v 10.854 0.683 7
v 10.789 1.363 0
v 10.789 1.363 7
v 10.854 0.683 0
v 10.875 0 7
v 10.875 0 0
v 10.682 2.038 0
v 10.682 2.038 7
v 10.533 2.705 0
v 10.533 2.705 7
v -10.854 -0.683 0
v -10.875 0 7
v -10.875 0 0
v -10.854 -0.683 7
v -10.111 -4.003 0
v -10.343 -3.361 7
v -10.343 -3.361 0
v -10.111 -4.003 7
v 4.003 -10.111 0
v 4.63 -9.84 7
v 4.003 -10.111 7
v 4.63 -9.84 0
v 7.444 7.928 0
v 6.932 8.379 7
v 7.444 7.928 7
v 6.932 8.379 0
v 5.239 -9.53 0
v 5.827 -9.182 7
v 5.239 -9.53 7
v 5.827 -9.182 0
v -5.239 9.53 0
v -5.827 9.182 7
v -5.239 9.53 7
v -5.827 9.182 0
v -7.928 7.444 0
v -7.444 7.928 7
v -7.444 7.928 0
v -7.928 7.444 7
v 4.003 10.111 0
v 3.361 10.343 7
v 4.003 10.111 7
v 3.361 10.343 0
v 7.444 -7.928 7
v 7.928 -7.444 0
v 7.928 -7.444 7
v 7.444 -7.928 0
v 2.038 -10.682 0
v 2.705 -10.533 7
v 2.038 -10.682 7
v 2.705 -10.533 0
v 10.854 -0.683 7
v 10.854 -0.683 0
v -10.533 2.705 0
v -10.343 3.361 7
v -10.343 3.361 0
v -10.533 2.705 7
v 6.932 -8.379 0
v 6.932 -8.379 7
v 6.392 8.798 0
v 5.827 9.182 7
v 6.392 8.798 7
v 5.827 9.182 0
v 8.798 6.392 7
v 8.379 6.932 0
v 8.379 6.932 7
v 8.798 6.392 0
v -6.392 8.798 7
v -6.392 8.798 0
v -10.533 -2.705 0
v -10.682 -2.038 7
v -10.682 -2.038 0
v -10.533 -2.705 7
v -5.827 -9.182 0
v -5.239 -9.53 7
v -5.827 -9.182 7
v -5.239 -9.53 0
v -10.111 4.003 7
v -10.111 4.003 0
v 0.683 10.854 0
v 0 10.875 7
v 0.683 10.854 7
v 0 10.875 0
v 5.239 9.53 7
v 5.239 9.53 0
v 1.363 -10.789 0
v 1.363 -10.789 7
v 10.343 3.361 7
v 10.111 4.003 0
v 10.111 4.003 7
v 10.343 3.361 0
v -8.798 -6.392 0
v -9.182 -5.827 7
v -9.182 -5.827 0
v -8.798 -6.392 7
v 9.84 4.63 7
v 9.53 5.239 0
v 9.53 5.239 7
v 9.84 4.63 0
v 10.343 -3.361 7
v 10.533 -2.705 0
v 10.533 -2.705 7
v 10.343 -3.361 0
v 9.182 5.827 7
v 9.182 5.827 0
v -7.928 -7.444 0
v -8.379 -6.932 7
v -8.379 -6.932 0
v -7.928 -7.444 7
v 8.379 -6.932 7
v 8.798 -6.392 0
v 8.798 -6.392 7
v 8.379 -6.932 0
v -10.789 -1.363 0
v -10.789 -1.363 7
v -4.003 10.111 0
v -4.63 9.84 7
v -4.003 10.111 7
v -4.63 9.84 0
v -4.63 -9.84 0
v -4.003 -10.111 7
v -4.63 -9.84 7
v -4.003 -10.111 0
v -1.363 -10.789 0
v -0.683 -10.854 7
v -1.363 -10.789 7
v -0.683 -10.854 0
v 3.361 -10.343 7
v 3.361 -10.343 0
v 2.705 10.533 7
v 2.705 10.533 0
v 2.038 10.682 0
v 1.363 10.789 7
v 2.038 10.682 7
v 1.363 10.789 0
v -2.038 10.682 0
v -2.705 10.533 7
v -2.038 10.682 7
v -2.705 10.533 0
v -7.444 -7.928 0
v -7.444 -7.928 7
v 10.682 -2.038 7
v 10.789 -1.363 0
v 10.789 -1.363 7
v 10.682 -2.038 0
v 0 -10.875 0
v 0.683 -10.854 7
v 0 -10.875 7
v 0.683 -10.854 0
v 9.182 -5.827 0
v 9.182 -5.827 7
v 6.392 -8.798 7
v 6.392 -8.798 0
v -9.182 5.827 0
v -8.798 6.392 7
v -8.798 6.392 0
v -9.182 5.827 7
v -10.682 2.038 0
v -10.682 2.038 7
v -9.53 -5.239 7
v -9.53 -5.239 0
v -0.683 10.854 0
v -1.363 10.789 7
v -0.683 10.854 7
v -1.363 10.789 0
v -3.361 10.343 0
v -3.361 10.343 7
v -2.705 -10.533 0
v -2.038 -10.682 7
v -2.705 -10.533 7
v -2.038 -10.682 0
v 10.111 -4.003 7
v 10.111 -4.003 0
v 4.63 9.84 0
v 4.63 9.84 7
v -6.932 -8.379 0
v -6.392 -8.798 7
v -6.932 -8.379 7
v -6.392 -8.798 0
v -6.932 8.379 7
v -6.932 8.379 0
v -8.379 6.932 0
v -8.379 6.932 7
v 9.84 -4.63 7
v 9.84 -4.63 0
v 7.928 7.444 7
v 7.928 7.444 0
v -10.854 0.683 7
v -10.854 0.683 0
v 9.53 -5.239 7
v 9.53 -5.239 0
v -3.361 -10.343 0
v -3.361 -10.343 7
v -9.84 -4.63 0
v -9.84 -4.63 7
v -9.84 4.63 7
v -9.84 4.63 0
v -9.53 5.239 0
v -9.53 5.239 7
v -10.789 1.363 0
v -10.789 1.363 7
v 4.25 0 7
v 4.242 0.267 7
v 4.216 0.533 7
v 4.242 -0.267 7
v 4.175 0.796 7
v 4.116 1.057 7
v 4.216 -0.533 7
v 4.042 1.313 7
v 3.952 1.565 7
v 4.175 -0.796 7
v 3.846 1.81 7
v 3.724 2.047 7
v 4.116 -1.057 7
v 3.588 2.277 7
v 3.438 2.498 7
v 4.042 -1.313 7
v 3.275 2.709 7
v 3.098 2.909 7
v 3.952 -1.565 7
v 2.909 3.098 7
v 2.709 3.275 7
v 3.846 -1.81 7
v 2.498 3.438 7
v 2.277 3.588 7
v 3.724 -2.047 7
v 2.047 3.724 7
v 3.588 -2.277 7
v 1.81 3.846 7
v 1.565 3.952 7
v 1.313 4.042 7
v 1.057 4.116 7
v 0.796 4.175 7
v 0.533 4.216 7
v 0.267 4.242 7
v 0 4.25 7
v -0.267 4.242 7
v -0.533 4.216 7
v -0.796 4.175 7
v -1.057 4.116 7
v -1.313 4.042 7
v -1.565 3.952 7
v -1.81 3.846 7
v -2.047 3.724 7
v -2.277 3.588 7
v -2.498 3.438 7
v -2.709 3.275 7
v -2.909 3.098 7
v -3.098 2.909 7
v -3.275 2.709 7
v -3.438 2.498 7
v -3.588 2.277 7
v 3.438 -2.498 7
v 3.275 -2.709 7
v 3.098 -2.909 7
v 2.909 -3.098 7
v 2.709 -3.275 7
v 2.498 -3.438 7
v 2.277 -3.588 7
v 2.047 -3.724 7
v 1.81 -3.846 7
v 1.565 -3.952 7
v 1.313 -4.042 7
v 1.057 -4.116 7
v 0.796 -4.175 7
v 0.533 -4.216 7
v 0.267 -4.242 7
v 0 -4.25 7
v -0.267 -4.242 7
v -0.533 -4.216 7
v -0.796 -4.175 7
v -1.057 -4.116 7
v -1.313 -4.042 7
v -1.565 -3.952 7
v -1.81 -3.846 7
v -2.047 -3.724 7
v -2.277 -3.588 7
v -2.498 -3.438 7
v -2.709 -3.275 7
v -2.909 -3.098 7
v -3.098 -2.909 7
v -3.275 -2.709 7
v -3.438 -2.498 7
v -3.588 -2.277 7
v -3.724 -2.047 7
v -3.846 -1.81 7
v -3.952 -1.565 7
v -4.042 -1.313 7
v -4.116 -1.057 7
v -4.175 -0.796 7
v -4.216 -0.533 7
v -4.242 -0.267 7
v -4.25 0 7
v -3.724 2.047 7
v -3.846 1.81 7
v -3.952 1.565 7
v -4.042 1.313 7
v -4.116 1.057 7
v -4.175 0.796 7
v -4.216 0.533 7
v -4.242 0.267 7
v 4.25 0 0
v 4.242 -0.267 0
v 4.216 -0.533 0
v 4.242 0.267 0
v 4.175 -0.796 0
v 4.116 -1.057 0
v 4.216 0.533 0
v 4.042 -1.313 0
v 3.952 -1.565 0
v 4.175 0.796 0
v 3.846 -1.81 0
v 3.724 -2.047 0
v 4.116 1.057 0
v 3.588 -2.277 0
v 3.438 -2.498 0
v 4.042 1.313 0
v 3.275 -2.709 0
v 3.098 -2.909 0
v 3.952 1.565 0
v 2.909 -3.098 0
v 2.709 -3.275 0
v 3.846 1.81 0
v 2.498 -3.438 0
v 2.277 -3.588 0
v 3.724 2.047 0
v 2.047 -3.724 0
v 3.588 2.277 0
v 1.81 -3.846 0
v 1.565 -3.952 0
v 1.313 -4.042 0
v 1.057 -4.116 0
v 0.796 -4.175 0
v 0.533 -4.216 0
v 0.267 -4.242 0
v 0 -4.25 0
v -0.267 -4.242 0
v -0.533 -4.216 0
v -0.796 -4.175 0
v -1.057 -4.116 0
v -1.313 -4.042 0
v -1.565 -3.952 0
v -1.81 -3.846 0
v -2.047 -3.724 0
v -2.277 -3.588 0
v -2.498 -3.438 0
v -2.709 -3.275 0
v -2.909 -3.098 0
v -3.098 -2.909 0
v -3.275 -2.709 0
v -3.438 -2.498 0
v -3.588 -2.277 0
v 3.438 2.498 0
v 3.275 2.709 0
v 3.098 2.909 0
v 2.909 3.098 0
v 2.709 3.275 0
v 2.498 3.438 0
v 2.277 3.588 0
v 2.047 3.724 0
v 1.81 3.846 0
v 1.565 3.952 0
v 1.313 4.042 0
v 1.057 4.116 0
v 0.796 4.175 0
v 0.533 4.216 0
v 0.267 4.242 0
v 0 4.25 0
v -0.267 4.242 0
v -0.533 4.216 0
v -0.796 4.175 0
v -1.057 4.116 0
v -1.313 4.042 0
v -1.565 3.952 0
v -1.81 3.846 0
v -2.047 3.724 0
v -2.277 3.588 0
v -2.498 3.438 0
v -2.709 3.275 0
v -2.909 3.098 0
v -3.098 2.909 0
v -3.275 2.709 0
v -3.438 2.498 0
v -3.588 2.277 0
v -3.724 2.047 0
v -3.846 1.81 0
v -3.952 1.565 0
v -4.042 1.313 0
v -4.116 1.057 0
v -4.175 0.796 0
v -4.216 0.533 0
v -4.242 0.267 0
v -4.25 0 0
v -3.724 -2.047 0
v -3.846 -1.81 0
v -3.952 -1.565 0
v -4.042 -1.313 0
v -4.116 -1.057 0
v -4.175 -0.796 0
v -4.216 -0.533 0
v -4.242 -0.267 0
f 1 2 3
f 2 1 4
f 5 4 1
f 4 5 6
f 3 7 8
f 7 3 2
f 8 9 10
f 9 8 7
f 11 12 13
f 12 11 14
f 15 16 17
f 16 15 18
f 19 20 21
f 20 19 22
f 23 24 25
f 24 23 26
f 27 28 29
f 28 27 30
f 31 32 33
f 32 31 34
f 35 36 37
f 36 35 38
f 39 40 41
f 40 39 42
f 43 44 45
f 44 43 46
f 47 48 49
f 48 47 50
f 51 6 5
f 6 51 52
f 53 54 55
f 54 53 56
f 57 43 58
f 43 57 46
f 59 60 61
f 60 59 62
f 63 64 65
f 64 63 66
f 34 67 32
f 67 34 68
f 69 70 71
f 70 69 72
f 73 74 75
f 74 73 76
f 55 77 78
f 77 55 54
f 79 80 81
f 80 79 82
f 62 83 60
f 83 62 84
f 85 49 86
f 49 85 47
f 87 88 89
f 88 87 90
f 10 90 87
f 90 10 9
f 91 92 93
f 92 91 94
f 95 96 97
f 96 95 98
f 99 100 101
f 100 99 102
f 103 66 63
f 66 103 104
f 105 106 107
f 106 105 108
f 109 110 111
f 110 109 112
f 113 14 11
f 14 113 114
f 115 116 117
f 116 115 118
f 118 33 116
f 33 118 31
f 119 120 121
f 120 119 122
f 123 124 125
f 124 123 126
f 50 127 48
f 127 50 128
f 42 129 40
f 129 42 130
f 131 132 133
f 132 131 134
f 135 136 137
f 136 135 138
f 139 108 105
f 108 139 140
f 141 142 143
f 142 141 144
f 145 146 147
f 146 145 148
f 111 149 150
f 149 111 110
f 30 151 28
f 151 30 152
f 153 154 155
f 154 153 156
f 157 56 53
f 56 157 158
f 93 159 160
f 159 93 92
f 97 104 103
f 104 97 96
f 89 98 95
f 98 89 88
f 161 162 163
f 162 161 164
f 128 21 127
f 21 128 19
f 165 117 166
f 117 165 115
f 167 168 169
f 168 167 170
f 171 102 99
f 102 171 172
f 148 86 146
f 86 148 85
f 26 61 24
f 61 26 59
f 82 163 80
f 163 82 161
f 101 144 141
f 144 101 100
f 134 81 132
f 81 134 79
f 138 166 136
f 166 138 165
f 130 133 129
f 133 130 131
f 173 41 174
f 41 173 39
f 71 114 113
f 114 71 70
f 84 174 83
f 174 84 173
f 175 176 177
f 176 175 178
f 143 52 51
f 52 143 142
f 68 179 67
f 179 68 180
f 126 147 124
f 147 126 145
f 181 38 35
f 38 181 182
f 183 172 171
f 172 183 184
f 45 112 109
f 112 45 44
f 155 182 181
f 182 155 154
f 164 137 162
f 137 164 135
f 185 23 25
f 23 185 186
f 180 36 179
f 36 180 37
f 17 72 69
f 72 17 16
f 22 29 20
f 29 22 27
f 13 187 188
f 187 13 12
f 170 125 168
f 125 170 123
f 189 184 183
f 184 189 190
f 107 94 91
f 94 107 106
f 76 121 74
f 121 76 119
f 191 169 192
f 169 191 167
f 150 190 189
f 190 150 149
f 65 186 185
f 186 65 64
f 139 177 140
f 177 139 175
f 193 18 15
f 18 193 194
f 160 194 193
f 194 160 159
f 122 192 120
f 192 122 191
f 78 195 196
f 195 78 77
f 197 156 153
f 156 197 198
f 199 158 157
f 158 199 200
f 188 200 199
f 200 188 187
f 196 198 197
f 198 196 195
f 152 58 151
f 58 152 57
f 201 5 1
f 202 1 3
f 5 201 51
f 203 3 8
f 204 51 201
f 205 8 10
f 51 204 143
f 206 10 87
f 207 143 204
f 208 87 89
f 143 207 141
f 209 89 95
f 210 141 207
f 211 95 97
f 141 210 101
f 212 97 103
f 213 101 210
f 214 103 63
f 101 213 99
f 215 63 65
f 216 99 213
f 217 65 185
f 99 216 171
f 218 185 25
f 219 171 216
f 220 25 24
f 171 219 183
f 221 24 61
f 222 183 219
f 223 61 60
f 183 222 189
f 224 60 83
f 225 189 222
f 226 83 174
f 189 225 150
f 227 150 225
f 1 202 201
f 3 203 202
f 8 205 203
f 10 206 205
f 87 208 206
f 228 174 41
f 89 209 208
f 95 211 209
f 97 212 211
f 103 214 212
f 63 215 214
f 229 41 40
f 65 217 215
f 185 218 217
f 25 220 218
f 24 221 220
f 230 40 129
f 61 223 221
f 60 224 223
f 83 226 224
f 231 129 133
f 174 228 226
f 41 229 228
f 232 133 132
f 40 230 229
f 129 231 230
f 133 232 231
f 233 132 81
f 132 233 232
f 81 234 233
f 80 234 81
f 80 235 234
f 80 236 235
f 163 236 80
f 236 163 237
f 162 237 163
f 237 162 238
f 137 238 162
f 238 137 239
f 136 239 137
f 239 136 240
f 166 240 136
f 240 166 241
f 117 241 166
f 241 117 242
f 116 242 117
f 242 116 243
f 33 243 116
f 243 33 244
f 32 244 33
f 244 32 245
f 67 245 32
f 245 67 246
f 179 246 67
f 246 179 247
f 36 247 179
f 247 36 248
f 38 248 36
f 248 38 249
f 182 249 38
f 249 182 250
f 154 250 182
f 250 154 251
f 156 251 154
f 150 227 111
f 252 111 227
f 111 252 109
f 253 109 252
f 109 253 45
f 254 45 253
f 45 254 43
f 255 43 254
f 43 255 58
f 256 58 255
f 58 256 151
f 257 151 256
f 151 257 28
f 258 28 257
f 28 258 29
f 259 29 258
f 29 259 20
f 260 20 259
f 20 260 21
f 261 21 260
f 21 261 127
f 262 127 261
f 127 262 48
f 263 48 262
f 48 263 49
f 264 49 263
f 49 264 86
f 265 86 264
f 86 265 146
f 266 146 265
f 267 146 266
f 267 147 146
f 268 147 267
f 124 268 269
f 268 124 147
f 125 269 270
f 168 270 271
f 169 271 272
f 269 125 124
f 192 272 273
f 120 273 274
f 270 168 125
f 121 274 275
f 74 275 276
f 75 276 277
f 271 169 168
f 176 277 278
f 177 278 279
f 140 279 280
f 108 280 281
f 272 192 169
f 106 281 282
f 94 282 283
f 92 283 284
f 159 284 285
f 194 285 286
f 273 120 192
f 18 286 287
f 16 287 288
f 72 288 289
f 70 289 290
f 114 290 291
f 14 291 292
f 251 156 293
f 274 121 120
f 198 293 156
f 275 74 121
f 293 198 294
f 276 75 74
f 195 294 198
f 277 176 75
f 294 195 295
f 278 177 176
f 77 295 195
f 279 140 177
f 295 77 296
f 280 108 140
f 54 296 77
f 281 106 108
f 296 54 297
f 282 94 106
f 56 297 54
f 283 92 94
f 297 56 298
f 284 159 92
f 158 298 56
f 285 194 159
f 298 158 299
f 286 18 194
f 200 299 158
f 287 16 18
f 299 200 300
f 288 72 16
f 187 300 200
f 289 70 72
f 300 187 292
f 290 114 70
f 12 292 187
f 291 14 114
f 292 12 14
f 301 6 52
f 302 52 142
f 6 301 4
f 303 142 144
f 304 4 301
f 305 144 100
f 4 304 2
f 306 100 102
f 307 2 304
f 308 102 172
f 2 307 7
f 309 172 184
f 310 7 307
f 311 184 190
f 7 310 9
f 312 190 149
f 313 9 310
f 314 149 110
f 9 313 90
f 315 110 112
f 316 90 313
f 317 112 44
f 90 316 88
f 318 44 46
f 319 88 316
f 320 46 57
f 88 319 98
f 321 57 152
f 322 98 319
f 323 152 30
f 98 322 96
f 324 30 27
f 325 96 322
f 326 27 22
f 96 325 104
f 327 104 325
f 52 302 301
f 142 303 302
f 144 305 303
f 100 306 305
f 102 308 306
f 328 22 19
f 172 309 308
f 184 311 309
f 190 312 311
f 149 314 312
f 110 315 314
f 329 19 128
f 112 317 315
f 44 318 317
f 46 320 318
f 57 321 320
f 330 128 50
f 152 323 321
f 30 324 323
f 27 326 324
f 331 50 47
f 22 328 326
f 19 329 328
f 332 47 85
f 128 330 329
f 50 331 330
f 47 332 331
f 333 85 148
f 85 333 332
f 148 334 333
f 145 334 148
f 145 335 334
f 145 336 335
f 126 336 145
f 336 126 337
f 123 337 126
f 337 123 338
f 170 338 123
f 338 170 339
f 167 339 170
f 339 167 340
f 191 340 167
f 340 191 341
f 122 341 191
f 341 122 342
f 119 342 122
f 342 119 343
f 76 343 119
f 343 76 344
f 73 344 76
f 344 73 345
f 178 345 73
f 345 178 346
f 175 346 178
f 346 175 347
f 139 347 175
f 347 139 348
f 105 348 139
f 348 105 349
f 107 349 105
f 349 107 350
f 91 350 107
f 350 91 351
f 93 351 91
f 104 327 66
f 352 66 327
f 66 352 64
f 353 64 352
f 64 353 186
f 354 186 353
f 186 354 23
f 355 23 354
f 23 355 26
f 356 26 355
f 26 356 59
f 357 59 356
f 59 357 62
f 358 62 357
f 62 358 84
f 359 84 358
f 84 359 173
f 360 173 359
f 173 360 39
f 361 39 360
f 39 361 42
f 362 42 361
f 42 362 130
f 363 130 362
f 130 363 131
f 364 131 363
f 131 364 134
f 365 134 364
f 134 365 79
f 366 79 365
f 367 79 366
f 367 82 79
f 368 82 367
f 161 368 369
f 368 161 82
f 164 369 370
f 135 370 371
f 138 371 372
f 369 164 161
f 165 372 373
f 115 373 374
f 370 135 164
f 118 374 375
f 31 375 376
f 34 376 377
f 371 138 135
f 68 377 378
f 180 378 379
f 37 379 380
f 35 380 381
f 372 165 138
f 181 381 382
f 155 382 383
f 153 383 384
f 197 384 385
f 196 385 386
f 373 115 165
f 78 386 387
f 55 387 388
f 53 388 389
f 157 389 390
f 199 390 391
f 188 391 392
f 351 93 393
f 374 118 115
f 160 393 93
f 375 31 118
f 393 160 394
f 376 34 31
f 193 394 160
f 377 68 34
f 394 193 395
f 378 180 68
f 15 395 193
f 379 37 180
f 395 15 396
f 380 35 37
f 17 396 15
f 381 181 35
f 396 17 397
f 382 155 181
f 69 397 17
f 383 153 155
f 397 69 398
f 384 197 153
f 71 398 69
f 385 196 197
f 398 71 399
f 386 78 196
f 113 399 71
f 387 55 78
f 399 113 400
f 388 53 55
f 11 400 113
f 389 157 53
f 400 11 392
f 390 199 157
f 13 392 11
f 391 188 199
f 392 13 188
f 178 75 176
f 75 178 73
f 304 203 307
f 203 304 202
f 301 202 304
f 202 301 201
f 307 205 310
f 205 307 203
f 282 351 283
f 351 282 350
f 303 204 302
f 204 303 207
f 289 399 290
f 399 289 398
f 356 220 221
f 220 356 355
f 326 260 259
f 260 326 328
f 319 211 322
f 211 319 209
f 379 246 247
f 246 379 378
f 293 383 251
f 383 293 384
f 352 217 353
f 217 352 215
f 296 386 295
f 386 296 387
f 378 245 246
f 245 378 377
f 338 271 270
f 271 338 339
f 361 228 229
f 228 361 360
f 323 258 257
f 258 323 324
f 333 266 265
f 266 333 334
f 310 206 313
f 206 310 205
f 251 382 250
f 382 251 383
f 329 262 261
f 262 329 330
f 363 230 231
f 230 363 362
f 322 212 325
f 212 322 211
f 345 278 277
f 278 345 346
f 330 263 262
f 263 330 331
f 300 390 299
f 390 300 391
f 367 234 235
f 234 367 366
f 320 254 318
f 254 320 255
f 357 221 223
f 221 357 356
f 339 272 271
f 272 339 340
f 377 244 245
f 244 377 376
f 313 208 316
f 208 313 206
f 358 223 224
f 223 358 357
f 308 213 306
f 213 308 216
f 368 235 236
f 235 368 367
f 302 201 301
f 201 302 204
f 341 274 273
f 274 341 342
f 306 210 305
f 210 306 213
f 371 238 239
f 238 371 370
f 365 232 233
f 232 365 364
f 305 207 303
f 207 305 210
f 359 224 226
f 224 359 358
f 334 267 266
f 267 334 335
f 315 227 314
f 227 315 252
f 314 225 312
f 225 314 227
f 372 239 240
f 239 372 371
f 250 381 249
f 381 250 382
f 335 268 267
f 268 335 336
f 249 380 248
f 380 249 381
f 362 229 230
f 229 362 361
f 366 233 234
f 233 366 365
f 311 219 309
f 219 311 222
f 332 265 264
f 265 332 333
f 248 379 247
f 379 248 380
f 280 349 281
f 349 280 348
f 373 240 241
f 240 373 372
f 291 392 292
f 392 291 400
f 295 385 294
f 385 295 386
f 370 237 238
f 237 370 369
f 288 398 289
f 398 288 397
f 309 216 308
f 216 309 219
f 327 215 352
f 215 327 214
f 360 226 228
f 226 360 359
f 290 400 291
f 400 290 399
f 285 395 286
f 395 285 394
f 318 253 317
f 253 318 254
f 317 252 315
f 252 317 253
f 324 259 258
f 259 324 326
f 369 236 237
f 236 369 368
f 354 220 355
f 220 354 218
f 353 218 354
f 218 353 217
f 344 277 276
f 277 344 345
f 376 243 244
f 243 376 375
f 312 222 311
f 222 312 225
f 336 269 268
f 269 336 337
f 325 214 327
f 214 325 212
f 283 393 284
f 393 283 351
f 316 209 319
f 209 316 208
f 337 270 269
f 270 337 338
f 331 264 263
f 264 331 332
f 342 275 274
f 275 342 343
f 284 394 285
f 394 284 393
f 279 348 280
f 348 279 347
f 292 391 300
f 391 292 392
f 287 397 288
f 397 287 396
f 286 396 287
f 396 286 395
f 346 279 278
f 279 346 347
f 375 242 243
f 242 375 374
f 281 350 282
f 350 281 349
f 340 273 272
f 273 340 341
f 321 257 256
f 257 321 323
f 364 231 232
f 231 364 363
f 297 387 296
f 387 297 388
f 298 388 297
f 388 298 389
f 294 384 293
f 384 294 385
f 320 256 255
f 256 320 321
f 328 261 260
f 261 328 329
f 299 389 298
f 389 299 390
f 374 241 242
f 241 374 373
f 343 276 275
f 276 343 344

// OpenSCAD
// Bearing Customiser (http://www.thingiverse.com/thing:313437)
// *********************************************************************************
// Version history:
// Author:			Date: 			Description:
// Whitecoat		2014-04-28		Initial build
// 
// *********************************************************************************
// customiser script

// Bearing Part Number
PartNo = 608;  // [ 603,  604, 605,606, 607, 608, 609, 623, 624, 625, 626, 627, 628, 629, 633, 634, 635, 636, 637, 638, 639, 673, 674, 675, 676, 677,  678,  683,  684,  685,  686,  687,  688,  689,  693,  694,  695,  696,  697,  698,  699,  6000, 6001, 6002, 6003, 6004, 6005, 6006, 6007, 6008, 6009, 6010, 6011, 6012, 6013, 6014, 6015, 6016, 6017, 6018, 6019, 6020, 6021, 6022, 6024, 6026, 6028, 6030, 6200, 6201, 6202, 6203, 6204, 6205, 6206, 6207, 6208, 6209, 6210, 6211, 6212, 6213, 6214, 6215, 6216, 6217, 6218, 6219, 6220, 6221, 6222, 6224, 6226, 6228, 6230, 6300, 6301, 6302, 6303, 6304, 6305, 6306, 6307, 6308, 6309, 6310, 6311, 6312, 6313, 6314, 6315, 6316, 6317, 6318, 6319, 6320, 6321, 6322, 6324, 6326, 6328, 6330, 6701, 6702, 6703, 6704, 6705, 6706, 6707, 6800, 6801, 6802, 6803, 6804, 6805, 6806, 6807, 6808, 6809, 6810, 6811, 6812, 6813, 6814, 6815, 6816, 6817, 6818, 6819, 6820, 6821, 6822, 6824, 6826, 6828, 6830, 6200, 6201, 6202, 6203, 6204, 6205, 6206, 6207, 6208, 6209, 6210, 6211, 6212, 6213, 6214, 6215, 6216, 6217, 6218, 6219, 6220, 6221, 6222, 6224, 6226, 6228, 6230, 6300, 6301, 6302, 6303, 6304, 6305, 6306, 6307, 6308, 6309, 6310, 6311, 6312, 6313, 6314, 6315, 6316, 6317, 6318, 6319, 6320, 6321, 6322, 6324, 6326, 6328, 6330, 6701, 6702, 6703, 6704,  6705, 6706, 6707, 6800, 6801, 6802, 6803, 6804, 6805, 6806, 6807, 6808, 6809, 6810, 6811, 6812, 6813, 6814, 6815, 6816, 6817, 6818, 6819, 6820, 6821, 6822, 6824, 6826, 6828, 6830, 6900, 6901, 6902, 6903, 6904, 6905, 6906, 6907, 6908, 6909, 6910, 6911, 6912, 6913, 6914, 6915, 6916, 6917, 6918, 6919, 6920, 6921, 6922, 6924, 6926, 6928, 6930, 16001, 16002, 16003, 16004, 16005, 16006, 16007, 16008, 16009, 16010, 16011, 16012, 16013, 16014, 16015, 16016, 16017, 16018, 16019, 16020, 16021, 16022 ]
 

// Printer Tolerance (in mm).  This makes the print just a bit smaller to account for inaccuracy in printing. 
PrintTolerance = 0.25; 

fake_bearing(BearingPartNoToDim(PartNo),PrintTolerance);


// *********************************************************************************
//  Pasted in a bearing library below this point so that there was a single script 
//  for the customiser app
// *********************************************************************************


// Bearing Library
// *********************************************************************************
// Version history:
// Author:			Date: 			Description:
// Whitecoat		2014-02-21		Initial build
// 
// *********************************************************************************
// Included Functions:
// [d, D, B] = BearingPartNoToDim(PartNo);  	//Returns Dimensions given Part Number
//
// *********************************************************************************
// Public Modules:
// fake_bearing([d, D, B],Tolerance);  	 	//Creates Bearing shape for given dimensions
//															// or: fake_bearing(BearingPartNoToDim(608));
// 
// BearingHole(p_bearing_size,p_tolerance)
// *********************************************************************************
// *********************************************************************************
// Included Internal Modules:
//	FakeBearingTest1();  			//Unit Test 1 - Fake Bearing

module FakeBearingTest1()
	{
	Tolerance = 1.0; 		
	fake_bearing([9,12,2],Tolerance);
	}




// build a fake bearing using size vector [d (Inner Diamater), D (Outer Diamater), B (Width)]
// ----------------------------------------------------------------
// This module just creates a cored cylinder in the same of a bearing.
module fake_bearing(p_bearing_size,p_tolerance=0.25)
	{
	// internal parameters
	l_diff_tol = 0.1;  	// a tollerance added to difference operations 
							 	// to ensure surface is subtracted

	// build
	difference()
		{
		cylinder(r=(p_bearing_size[1]-p_tolerance)/2,h=p_bearing_size[2],$fn=100);
		translate([0,0,-l_diff_tol])
			{
			cylinder(r=(p_bearing_size[0])/2+p_tolerance,h=p_bearing_size[2]+l_diff_tol*2,$fn=100);
			}
		}
	}

// BearingHole [d (Inner Diamater), D (Outer Diamater), B (Width)]
// ----------------------------------------------------------------
// This module is intended for subtraction in a difference to make a hole for a bearing
module BearingHole(p_bearing_size,p_tolerance=0.25)
	{
	// internal parameters
	l_diff_tol = 0.1;  	// a tollerance added to difference operations 
							 	// to ensure surface is subtracted

	// build
	difference()
		{
		cylinder(r=(p_bearing_size[1]+p_tolerance)/2,h=p_bearing_size[2],$fn=100);
		}
	}

// bearing PartNo to Dimension conversion - result [d, D, B] in mm
// ----------------------------------------------------------------
// I did find something like this in the generic bearing library with MCAD, but 
// it had a farily limited set of part numbers, I wanted a more complete 
// table for this purpose, so I wrote my own.
function BearingPartNoToDim(PartNo) =
// 600 series (ZZ)
	PartNo == 603 ? [3, 9,  5]:
	PartNo == 604 ? [4, 12, 4]:
	PartNo == 605 ? [5, 14, 5]:
	PartNo == 606 ? [6, 17, 6]:
	PartNo == 607 ? [7, 19, 6]:
	PartNo == 608 ? [8, 22, 7]:
	PartNo == 609 ? [9, 24, 7]:
	PartNo == 623 ? [3, 10, 4]:
	PartNo == 624 ? [4, 13, 5]:
	PartNo == 625 ? [5, 16, 5]:
	PartNo == 626 ? [6, 19, 6]:
	PartNo == 627 ? [7, 22, 7]:
	PartNo == 628 ? [8, 22, 7]:
	PartNo == 629 ? [9, 22, 7]:
	PartNo == 633 ? [3, 13, 5]:
	PartNo == 634 ? [4, 16, 5]:
	PartNo == 635 ? [5, 19, 6]:
	PartNo == 636 ? [6, 22, 7]:
	PartNo == 637 ? [7, 26, 9]:
	PartNo == 638 ? [8, 28, 9]:
	PartNo == 639 ? [9, 30, 10]:
	PartNo == 673 ? [3, 6, 2.5]:
	PartNo == 674 ? [4, 7, 2.5]:
	PartNo == 675 ? [5, 8, 2.5]:
	PartNo == 676 ? [6, 10, 3]:
	PartNo == 677 ? [7, 11, 3]:
	PartNo == 678 ? [8, 12, 3.5]:
	PartNo == 683 ? [3, 7, 3]:
	PartNo == 684 ? [4, 9, 4]:
	PartNo == 685 ? [5, 11, 5]:
	PartNo == 686 ? [6, 13, 5]:
	PartNo == 687 ? [7, 14, 5]:
	PartNo == 688 ? [8, 16, 5]:
	PartNo == 689 ? [9, 17, 5]:
	PartNo == 693 ? [3, 8, 4]:
	PartNo == 694 ? [4, 11, 4]:
	PartNo == 695 ? [5, 13, 4]:
	PartNo == 696 ? [6, 15, 5]:
	PartNo == 697 ? [7, 17, 5]:
	PartNo == 698 ? [8, 19, 6]:
	PartNo == 699 ? [9, 20, 6]:
	PartNo == 6000 ? [10,  26,  8]:
	PartNo == 6001 ? [12,  28,  8]:
	PartNo == 6002 ? [15,  32,  9]:
	PartNo == 6003 ? [17,  35,  10]:
	PartNo == 6004 ? [20,  42,  12]:
	PartNo == 6005 ? [25,  47,  12]:
	PartNo == 6006 ? [30,  55,  13]:
	PartNo == 6007 ? [35,  62,  14]:
	PartNo == 6008 ? [40,  68,  15]:
	PartNo == 6009 ? [45,  75,  16]:
	PartNo == 6010 ? [50,  80,  16]:
	PartNo == 6011 ? [55,  90,  18]:
	PartNo == 6012 ? [60,  95,  18]:
	PartNo == 6013 ? [65,  100,  18]:
	PartNo == 6014 ? [70,  110,  20]:
	PartNo == 6015 ? [75,  115,  20]:
	PartNo == 6016 ? [80,  125,  22]:
	PartNo == 6017 ? [85,  130,  22]:
	PartNo == 6018 ? [90,  140,  24]:
	PartNo == 6019 ? [95,  145,  24]:
	PartNo == 6020 ? [100,  150,  24]:
	PartNo == 6021 ? [105,  160,  26]:
	PartNo == 6022 ? [110,  170,  28]:
	PartNo == 6024 ? [120,  180,  28]:
	PartNo == 6026 ? [130,  200,  33]:
	PartNo == 6028 ? [140,  210,  33]:
	PartNo == 6030 ? [150,  225,  35]:
	PartNo == 6200 ? [10,  30,  9]:
	PartNo == 6201 ? [12,  32,  10]:
	PartNo == 6202 ? [15,  35,  11]:
	PartNo == 6203 ? [17,  40,  12]:
	PartNo == 6204 ? [20,  47,  14]:
	PartNo == 6205 ? [25,  52,  15]:
	PartNo == 6206 ? [30,  62,  16]:
	PartNo == 6207 ? [35,  72,  17]:
	PartNo == 6208 ? [40,  80,  18]:
	PartNo == 6209 ? [45,  85,  19]:
	PartNo == 6210 ? [50,  90,  20]:
	PartNo == 6211 ? [55,  100,  21]:
	PartNo == 6212 ? [60,  110,  22]:
	PartNo == 6213 ? [65,  120,  23]:
	PartNo == 6214 ? [70,  125,  24]:
	PartNo == 6215 ? [75,  130,  25]:
	PartNo == 6216 ? [80,  140,  26]:
	PartNo == 6217 ? [85,  150,  28]:
	PartNo == 6218 ? [90,  160,  30]:
	PartNo == 6219 ? [95,  170,  32]:
	PartNo == 6220 ? [100,  180,  34]:
	PartNo == 6221 ? [105,  190,  36]:
	PartNo == 6222 ? [110,  200,  38]:
	PartNo == 6224 ? [120,  215,  40]:
	PartNo == 6226 ? [130,  230,  40]:
	PartNo == 6228 ? [140,  250,  42]:
	PartNo == 6230 ? [150,  270,  45]:
	PartNo == 6300 ? [10,  35,  11]:
	PartNo == 6301 ? [12,  37,  12]:
	PartNo == 6302 ? [15,  42,  13]:
	PartNo == 6303 ? [17,  47,  14]:
	PartNo == 6304 ? [20,  52,  15]:
	PartNo == 6305 ? [25,  62,  17]:
	PartNo == 6306 ? [30,  72,  19]:
	PartNo == 6307 ? [35,  80,  21]:
	PartNo == 6308 ? [40,  90,  23]:
	PartNo == 6309 ? [45,  100,  25]:
	PartNo == 6310 ? [50,  110,  27]:
	PartNo == 6311 ? [55,  120,  29]:
	PartNo == 6312 ? [60,  130,  31]:
	PartNo == 6313 ? [65,  140,  33]:
	PartNo == 6314 ? [70,  150,  35]:
	PartNo == 6315 ? [75,  160,  37]:
	PartNo == 6316 ? [80,  170,  39]:
	PartNo == 6317 ? [85,  180,  41]:
	PartNo == 6318 ? [90,  190,  43]:
	PartNo == 6319 ? [95,  200,  45]:
	PartNo == 6320 ? [100,  215,  47]:
	PartNo == 6321 ? [105,  225,  49]:
	PartNo == 6322 ? [110,  240,  50]:
	PartNo == 6324 ? [120,  260,  55]:
	PartNo == 6326 ? [130,  280,  58]:
	PartNo == 6328 ? [140,  300,  62]:
	PartNo == 6330 ? [150,  320,  65]:
	PartNo == 6701 ? [12,  18,  4]:
	PartNo == 6702 ? [15,  21,  4]:
	PartNo == 6703 ? [17,  23,  4]:
	PartNo == 6704 ? [20,  27,  4]:
	PartNo == 6705 ? [25,  32,  4]:
	PartNo == 6706 ? [30,  37,  4]:
	PartNo == 6707 ? [35,  44,  5]:
	PartNo == 6800 ? [10,  19,  5]:
	PartNo == 6801 ? [12,  21,  5]:
	PartNo == 6802 ? [15,  24,  5]:
	PartNo == 6803 ? [17,  26,  5]:
	PartNo == 6804 ? [20,  32,  7]:
	PartNo == 6805 ? [25,  37,  7]:
	PartNo == 6806 ? [30,  42,  7]:
	PartNo == 6807 ? [35,  47,  7]:
	PartNo == 6808 ? [40,  52,  7]:
	PartNo == 6809 ? [45,  58,  7]:
	PartNo == 6810 ? [50,  65,  7]:
	PartNo == 6811 ? [55,  72,  9]:
	PartNo == 6812 ? [60,  78,  10]:
	PartNo == 6813 ? [65,  85,  10]:
	PartNo == 6814 ? [70,  90,  10]:
	PartNo == 6815 ? [75,  95,  10]:
	PartNo == 6816 ? [80,  100,  10]:
	PartNo == 6817 ? [85,  110,  13]:
	PartNo == 6818 ? [90,  115,  13]:
	PartNo == 6819 ? [95,  120,  13]:
	PartNo == 6820 ? [100,  125,  13]:
	PartNo == 6821 ? [105,  130,  13]:
	PartNo == 6822 ? [110,  140,  16]:
	PartNo == 6824 ? [120,  150,  16]:
	PartNo == 6826 ? [130,  165,  18]:
	PartNo == 6828 ? [140,  175,  18]:
	PartNo == 6830 ? [150,  190,  20]:
	PartNo == 6200 ? [10,  30,  9]:
	PartNo == 6201 ? [12,  32,  10]:
	PartNo == 6202 ? [15,  35,  11]:
	PartNo == 6203 ? [17,  40,  12]:
	PartNo == 6204 ? [20,  47,  14]:
	PartNo == 6205 ? [25,  52,  15]:
	PartNo == 6206 ? [30,  62,  16]:
	PartNo == 6207 ? [35,  72,  17]:
	PartNo == 6208 ? [40,  80,  18]:
	PartNo == 6209 ? [45,  85,  19]:
	PartNo == 6210 ? [50,  90,  20]:
	PartNo == 6211 ? [55,  100,  21]:
	PartNo == 6212 ? [60,  110,  22]:
	PartNo == 6213 ? [65,  120,  23]:
	PartNo == 6214 ? [70,  125,  24]:
	PartNo == 6215 ? [75,  130,  25]:
	PartNo == 6216 ? [80,  140,  26]:
	PartNo == 6217 ? [85,  150,  28]:
	PartNo == 6218 ? [90,  160,  30]:
	PartNo == 6219 ? [95,  170,  32]:
	PartNo == 6220 ? [100,  180,  34]:
	PartNo == 6221 ? [105,  190,  36]:
	PartNo == 6222 ? [110,  200,  38]:
	PartNo == 6224 ? [120,  215,  40]:
	PartNo == 6226 ? [130,  230,  40]:
	PartNo == 6228 ? [140,  250,  42]:
	PartNo == 6230 ? [150,  270,  45]:
	PartNo == 6300 ? [10,  35,  11]:
	PartNo == 6301 ? [12,  37,  12]:
	PartNo == 6302 ? [15,  42,  13]:
	PartNo == 6303 ? [17,  47,  14]:
	PartNo == 6304 ? [20,  52,  15]:
	PartNo == 6305 ? [25,  62,  17]:
	PartNo == 6306 ? [30,  72,  19]:
	PartNo == 6307 ? [35,  80,  21]:
	PartNo == 6308 ? [40,  90,  23]:
	PartNo == 6309 ? [45,  100,  25]:
	PartNo == 6310 ? [50,  110,  27]:
	PartNo == 6311 ? [55,  120,  29]:
	PartNo == 6312 ? [60,  130,  31]:
	PartNo == 6313 ? [65,  140,  33]:
	PartNo == 6314 ? [70,  150,  35]:
	PartNo == 6315 ? [75,  160,  37]:
	PartNo == 6316 ? [80,  170,  39]:
	PartNo == 6317 ? [85,  180,  41]:
	PartNo == 6318 ? [90,  190,  43]:
	PartNo == 6319 ? [95,  200,  45]:
	PartNo == 6320 ? [100,  215,  47]:
	PartNo == 6321 ? [105,  225,  49]:
	PartNo == 6322 ? [110,  240,  50]:
	PartNo == 6324 ? [120,  260,  55]:
	PartNo == 6326 ? [130,  280,  58]:
	PartNo == 6328 ? [140,  300,  62]:
	PartNo == 6330 ? [150,  320,  65]:
	PartNo == 6701 ? [12,  18,  4]:
	PartNo == 6702 ? [15,  21,  4]:
	PartNo == 6703 ? [17,  23,  4]:
	PartNo == 6704 ? [20,  27,  4]:
	PartNo == 6705 ? [25,  32,  4]:
	PartNo == 6706 ? [30,  37,  4]:
	PartNo == 6707 ? [35,  44,  5]:
	PartNo == 6800 ? [10,  19,  5]:
	PartNo == 6801 ? [12,  21,  5]:
	PartNo == 6802 ? [15,  24,  5]:
	PartNo == 6803 ? [17,  26,  5]:
	PartNo == 6804 ? [20,  32,  7]:
	PartNo == 6805 ? [25,  37,  7]:
	PartNo == 6806 ? [30,  42,  7]:
	PartNo == 6807 ? [35,  47,  7]:
	PartNo == 6808 ? [40,  52,  7]:
	PartNo == 6809 ? [45,  58,  7]:
	PartNo == 6810 ? [50,  65,  7]:
	PartNo == 6811 ? [55,  72,  9]:
	PartNo == 6812 ? [60,  78,  10]:
	PartNo == 6813 ? [65,  85,  10]:
	PartNo == 6814 ? [70,  90,  10]:
	PartNo == 6815 ? [75,  95,  10]:
	PartNo == 6816 ? [80,  100,  10]:
	PartNo == 6817 ? [85,  110,  13]:
	PartNo == 6818 ? [90,  115,  13]:
	PartNo == 6819 ? [95,  120,  13]:
	PartNo == 6820 ? [100,  125,  13]:
	PartNo == 6821 ? [105,  130,  13]:
	PartNo == 6822 ? [110,  140,  16]:
	PartNo == 6824 ? [120,  150,  16]:
	PartNo == 6826 ? [130,  165,  18]:
	PartNo == 6828 ? [140,  175,  18]:
	PartNo == 6830 ? [150,  190,  20]:
	PartNo == 6900 ? [10,  22,  6]:
	PartNo == 6901 ? [12,  24,  6]:
	PartNo == 6902 ? [15,  28,  7]:
	PartNo == 6903 ? [17,  30,  7]:
	PartNo == 6904 ? [20,  37,  9]:
	PartNo == 6905 ? [25,  42,  9]:
	PartNo == 6906 ? [30,  47,  9]:
	PartNo == 6907 ? [35,  55,  10]:
	PartNo == 6908 ? [40,  62,  12]:
	PartNo == 6909 ? [45,  68,  12]:
	PartNo == 6910 ? [50,  72,  12]:
	PartNo == 6911 ? [55,  80,  13]:
	PartNo == 6912 ? [60,  85,  13]:
	PartNo == 6913 ? [65,  90,  13]:
	PartNo == 6914 ? [70,  100,  16]:
	PartNo == 6915 ? [75,  105,  16]:
	PartNo == 6916 ? [80,  110,  16]:
	PartNo == 6917 ? [85,  120,  18]:
	PartNo == 6918 ? [90,  125,  18]:
	PartNo == 6919 ? [95,  130,  18]:
	PartNo == 6920 ? [100,  140,  20]:
	PartNo == 6921 ? [105,  145,  20]:
	PartNo == 6922 ? [110,  150,  20]:
	PartNo == 6924 ? [120,  165,  22]:
	PartNo == 6926 ? [130,  180,  24]:
	PartNo == 6928 ? [140,  190,  24]:
	PartNo == 6930 ? [150,  210,  28]:
	PartNo == 16001 ? [12,  28,  7]:
	PartNo == 16002 ? [15,  32,  8]:
	PartNo == 16003 ? [17,  35,  8]:
	PartNo == 16004 ? [20,  42,  8]:
	PartNo == 16005 ? [25,  47,  8]:
	PartNo == 16006 ? [30,  55,  9]:
	PartNo == 16007 ? [35,  62,  9]:
	PartNo == 16008 ? [40,  68,  9]:
	PartNo == 16009 ? [45,  75,  10]:
	PartNo == 16010 ? [50,  80,  10]:
	PartNo == 16011 ? [55,  90,  11]:
	PartNo == 16012 ? [60,  95,  11]:
	PartNo == 16013 ? [65,  100,  11]:
	PartNo == 16014 ? [70,  110,  13]:
	PartNo == 16015 ? [75,  115,  13]:
	PartNo == 16016 ? [80,  125,  14]:
	PartNo == 16017 ? [85,  130,  14]:
	PartNo == 16018 ? [90,  140,  16]:
	PartNo == 16019 ? [95,  145,  16]:
	PartNo == 16020 ? [100,  150,  16]:
	PartNo == 16021 ? [105,  160,  18]:
	PartNo == 16022 ? [110,  170,  19]:
	// default
   BearingPartNoToDim(608); // default to 608
